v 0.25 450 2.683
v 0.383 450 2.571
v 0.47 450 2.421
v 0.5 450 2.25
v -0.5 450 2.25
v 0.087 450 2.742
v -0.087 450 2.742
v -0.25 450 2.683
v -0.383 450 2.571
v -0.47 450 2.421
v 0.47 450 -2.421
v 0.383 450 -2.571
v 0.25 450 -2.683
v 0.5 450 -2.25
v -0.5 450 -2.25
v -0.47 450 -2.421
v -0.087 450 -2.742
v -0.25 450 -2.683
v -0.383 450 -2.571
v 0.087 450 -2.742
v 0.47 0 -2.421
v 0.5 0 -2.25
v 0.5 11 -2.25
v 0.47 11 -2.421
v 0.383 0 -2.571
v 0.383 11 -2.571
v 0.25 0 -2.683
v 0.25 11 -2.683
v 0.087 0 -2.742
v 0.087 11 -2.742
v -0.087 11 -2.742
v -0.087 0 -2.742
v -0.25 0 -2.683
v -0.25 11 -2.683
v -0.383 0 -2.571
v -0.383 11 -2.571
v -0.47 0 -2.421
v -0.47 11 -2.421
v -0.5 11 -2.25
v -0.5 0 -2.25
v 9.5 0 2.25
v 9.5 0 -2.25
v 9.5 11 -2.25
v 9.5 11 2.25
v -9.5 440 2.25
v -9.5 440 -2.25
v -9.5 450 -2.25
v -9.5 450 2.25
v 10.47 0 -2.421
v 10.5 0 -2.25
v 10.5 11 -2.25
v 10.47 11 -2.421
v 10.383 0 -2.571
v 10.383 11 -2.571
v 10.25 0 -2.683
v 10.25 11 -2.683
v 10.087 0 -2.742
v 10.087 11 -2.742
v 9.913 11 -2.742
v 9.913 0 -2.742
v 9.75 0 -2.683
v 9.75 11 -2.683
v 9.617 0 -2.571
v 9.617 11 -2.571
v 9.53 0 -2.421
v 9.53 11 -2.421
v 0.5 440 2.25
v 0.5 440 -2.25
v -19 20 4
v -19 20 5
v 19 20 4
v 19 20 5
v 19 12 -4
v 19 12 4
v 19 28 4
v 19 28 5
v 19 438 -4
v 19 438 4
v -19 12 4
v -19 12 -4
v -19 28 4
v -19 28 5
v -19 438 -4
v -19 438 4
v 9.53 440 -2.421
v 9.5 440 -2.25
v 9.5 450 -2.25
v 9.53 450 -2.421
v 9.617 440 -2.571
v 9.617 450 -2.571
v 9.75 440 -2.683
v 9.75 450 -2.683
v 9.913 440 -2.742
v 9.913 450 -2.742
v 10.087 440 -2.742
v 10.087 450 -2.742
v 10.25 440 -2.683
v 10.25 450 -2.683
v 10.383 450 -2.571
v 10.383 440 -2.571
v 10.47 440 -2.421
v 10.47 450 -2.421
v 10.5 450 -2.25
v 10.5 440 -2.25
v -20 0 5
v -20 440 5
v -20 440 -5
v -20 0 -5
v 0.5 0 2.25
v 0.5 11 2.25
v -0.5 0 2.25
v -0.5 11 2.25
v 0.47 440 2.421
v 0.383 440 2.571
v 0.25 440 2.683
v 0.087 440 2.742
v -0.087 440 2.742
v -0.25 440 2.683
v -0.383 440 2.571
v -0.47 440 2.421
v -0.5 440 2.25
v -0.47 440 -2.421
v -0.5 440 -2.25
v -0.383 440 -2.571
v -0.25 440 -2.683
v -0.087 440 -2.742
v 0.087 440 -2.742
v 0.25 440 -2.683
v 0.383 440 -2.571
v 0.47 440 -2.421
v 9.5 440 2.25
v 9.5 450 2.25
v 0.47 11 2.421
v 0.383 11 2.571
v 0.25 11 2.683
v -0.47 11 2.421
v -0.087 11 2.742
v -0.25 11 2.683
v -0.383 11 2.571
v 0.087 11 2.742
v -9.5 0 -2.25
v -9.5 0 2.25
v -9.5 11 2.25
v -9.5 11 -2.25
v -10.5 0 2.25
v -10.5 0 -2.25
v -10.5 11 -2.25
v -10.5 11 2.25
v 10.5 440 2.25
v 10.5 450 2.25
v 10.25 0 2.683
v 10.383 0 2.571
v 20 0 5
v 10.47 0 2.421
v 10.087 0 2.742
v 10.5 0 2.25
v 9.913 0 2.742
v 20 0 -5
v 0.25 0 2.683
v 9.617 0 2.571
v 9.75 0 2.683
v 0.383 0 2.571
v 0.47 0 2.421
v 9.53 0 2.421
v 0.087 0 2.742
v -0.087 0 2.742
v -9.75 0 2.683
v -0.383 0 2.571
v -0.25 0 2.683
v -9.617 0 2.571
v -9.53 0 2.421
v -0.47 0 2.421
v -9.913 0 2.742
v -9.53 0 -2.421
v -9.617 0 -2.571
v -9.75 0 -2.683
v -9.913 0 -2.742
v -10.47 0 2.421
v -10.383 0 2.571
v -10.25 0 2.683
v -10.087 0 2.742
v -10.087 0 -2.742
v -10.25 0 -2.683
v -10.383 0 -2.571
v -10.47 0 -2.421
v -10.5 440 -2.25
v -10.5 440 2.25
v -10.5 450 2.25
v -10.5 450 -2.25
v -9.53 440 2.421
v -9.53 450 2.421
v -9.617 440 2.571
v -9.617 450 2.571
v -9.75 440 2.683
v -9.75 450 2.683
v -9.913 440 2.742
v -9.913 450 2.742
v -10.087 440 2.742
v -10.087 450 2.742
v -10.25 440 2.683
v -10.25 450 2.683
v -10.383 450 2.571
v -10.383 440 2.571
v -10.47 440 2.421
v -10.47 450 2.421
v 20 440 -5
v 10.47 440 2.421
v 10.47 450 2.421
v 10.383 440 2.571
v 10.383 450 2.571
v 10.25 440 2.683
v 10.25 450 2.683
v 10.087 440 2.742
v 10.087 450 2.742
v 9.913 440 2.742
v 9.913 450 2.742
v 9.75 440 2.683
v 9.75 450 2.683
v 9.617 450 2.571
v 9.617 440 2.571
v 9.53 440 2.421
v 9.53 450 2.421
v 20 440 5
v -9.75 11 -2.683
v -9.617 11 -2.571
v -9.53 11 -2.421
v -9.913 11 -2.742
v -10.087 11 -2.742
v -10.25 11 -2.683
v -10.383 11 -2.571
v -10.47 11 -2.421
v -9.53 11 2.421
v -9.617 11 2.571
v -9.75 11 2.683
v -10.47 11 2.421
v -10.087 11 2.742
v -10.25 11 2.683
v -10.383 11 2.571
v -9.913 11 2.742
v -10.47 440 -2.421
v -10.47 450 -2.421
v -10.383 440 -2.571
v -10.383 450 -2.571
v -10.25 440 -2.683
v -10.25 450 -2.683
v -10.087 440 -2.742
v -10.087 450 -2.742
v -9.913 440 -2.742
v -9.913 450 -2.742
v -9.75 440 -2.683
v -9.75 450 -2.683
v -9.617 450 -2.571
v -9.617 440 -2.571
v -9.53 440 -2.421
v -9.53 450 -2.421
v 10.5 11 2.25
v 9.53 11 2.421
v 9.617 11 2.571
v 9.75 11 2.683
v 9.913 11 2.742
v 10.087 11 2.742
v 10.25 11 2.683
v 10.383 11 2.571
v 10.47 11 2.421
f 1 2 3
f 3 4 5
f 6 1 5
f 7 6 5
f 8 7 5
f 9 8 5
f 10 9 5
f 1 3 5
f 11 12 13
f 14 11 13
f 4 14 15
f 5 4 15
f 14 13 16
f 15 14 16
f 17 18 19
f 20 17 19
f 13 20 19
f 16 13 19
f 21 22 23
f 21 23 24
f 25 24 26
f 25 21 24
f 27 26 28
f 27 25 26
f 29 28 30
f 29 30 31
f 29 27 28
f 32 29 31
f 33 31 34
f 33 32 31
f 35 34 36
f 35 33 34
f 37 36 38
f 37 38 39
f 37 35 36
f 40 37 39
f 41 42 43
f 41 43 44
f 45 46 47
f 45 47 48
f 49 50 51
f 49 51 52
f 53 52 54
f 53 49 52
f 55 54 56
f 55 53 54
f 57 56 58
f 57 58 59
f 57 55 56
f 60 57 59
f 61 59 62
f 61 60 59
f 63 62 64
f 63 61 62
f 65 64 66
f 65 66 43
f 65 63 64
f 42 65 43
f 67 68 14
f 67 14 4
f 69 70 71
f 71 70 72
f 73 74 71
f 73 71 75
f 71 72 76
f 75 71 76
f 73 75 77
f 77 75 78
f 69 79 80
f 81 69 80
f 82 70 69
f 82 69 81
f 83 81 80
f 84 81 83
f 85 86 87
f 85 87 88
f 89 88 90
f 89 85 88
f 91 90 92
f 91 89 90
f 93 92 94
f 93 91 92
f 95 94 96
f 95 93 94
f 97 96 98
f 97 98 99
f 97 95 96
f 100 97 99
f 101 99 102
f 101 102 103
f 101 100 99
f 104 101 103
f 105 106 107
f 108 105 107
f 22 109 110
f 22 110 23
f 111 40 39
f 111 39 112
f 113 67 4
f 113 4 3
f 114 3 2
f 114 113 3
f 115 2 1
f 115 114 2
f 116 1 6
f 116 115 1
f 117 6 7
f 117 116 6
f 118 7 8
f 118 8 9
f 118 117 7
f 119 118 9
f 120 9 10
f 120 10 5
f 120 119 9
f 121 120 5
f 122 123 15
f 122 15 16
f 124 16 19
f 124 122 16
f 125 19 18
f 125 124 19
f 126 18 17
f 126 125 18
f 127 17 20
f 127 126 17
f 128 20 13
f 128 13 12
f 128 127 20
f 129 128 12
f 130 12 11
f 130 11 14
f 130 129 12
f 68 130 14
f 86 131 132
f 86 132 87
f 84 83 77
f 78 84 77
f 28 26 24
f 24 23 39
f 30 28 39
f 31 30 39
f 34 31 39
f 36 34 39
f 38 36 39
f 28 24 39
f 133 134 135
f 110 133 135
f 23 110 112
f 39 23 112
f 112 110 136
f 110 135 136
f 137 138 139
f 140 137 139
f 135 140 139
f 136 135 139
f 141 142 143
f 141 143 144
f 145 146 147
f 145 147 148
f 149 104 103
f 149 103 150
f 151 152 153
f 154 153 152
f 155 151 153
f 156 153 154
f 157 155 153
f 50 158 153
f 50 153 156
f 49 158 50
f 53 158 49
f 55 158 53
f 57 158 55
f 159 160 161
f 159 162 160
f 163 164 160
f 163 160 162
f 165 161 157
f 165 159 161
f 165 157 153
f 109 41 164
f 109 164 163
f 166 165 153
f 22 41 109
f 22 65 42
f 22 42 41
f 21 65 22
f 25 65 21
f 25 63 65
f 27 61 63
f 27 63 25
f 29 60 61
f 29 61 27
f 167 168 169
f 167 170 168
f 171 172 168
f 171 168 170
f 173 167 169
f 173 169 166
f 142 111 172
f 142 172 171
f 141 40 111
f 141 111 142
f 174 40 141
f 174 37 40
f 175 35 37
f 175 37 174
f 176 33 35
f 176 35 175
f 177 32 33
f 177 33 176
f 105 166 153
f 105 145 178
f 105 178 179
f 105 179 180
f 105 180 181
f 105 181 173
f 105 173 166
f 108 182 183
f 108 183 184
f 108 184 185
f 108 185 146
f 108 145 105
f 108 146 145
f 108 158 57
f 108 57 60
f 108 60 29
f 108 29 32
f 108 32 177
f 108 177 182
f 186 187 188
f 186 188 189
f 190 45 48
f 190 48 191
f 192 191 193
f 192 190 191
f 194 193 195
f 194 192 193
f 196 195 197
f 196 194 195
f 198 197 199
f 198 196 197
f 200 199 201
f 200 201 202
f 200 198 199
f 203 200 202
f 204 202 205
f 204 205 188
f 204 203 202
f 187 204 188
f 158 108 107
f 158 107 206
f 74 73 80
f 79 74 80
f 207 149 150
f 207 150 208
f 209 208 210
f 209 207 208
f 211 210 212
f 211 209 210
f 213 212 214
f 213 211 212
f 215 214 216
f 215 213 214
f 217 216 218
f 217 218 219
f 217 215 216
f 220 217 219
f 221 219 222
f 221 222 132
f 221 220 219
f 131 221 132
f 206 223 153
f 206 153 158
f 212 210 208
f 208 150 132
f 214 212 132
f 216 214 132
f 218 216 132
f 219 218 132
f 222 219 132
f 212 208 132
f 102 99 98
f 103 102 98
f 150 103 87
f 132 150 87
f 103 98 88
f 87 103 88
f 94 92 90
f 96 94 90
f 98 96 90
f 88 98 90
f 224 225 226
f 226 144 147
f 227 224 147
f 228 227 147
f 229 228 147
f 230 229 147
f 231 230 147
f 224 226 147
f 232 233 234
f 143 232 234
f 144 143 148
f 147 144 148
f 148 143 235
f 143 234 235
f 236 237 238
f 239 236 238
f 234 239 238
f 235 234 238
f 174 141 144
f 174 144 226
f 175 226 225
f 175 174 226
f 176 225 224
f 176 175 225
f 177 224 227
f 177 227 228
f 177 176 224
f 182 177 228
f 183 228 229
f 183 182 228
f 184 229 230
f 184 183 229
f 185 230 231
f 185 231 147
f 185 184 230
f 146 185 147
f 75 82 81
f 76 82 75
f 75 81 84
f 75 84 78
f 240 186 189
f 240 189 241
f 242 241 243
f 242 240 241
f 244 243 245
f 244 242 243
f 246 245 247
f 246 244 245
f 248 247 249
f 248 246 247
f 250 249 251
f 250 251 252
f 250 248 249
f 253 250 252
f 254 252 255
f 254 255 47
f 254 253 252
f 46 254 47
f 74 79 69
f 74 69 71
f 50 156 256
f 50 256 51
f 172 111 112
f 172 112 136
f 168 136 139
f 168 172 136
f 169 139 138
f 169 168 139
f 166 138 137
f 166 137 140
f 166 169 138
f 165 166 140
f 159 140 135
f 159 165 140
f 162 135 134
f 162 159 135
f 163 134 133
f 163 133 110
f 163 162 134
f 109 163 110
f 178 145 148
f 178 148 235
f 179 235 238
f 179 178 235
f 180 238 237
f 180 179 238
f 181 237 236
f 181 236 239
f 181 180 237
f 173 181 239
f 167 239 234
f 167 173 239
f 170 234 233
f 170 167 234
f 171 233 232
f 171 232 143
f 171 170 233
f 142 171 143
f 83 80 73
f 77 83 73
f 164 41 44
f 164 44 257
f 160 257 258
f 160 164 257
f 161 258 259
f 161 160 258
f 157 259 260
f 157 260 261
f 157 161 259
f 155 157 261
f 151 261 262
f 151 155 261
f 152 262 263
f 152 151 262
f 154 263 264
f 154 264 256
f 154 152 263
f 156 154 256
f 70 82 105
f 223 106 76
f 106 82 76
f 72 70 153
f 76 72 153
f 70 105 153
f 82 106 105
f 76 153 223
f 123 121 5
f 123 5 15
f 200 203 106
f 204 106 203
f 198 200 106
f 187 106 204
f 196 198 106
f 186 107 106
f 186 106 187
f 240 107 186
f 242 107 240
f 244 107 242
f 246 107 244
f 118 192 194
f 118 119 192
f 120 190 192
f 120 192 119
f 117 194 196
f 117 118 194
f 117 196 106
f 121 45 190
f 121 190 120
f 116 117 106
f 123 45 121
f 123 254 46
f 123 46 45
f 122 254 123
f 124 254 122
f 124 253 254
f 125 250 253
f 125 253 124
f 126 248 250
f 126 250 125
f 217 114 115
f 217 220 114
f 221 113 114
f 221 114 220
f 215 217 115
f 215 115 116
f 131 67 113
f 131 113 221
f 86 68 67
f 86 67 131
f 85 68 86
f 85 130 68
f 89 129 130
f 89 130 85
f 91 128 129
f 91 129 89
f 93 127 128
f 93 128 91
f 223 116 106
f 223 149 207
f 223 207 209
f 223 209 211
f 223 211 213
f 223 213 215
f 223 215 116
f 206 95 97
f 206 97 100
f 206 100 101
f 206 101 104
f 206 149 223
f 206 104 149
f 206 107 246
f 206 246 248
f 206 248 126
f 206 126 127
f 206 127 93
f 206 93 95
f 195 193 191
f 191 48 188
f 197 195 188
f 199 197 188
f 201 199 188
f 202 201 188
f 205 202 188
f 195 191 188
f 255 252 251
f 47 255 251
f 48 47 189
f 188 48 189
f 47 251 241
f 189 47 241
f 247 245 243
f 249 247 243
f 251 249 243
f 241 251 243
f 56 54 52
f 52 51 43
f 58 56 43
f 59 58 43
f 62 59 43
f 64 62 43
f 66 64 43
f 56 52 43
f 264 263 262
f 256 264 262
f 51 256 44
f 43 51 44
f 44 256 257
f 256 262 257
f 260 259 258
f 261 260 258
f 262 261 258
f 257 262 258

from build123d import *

# Parameters (mm, degrees)
SKETCH2_W           = 40
SKETCH2_H           = 10
BOSS_EXTRUDE2_DEPTH = 440
SKETCH3_W           = 38
SKETCH3_H           = 8
CUT_EXTRUDE1_DEPTH  = 438
BOSS_EXTRUDE4_DEPTH = 10
LPATTERN2_COUNT     = 3
LPATTERN2_PITCH     = 10
SKETCH5_W           = 38
SKETCH5_H           = 8
BOSS_EXTRUDE5_DEPTH = 12
CUT_EXTRUDE2_DEPTH  = 11
LPATTERN3_COUNT     = 3
LPATTERN3_PITCH     = 10
SKETCH7_W           = 38
SKETCH7_H           = 8
CUT_EXTRUDE3_DEPTH  = 5


with BuildPart() as part:
    # Sketch2 → Boss-Extrude2 (new body)
    with BuildSketch(Plane(origin=(0, 0, 0), x_dir=(1, 0, 0), z_dir=(0, 1, 0))):
        Rectangle(SKETCH2_W, SKETCH2_H)
    extrude(amount=BOSS_EXTRUDE2_DEPTH)

    # Sketch3 → Cut-Extrude1 (cut)
    with BuildSketch(Plane(origin=(0, 0, 0), x_dir=(1, 0, 0), z_dir=(0, 1, 0))):
        Rectangle(SKETCH3_W, SKETCH3_H)
    extrude(amount=CUT_EXTRUDE1_DEPTH, mode=Mode.SUBTRACT)

    # Sketch4 → Boss-Extrude4 (add)
    with BuildSketch(Plane(origin=(0, 440, 0), x_dir=(1, 0, 0), z_dir=(0, 1, 0))):
        with BuildLine():
            Line((-10.5, -2.25), (-10.5, 2.25))
            ThreePointArc((-10.5, 2.25), (-10, 2.75), (-9.5, 2.25))
            Line((-9.5, 2.25), (-9.5, -2.25))
            ThreePointArc((-9.5, -2.25), (-10, -2.75), (-10.5, -2.25))
        make_face()
    boss_extrude4 = extrude(amount=BOSS_EXTRUDE4_DEPTH)

    # LPattern2: Boss-Extrude4 ×3
    with Locations(*[(i * LPATTERN2_PITCH, 0, 0) for i in range(1, LPATTERN2_COUNT)]):
        add(boss_extrude4)

    # Sketch5 → Boss-Extrude5 (add)
    with BuildSketch(Plane(origin=(0, 0, 0), x_dir=(-1, 0, 0), z_dir=(0, -1, 0))):
        Rectangle(SKETCH5_W, SKETCH5_H)
    extrude(amount=-BOSS_EXTRUDE5_DEPTH)

    # Sketch6 → Cut-Extrude2 (cut)
    with BuildSketch(Plane.XZ):
        with BuildLine():
            Line((10.5, 2.25), (10.5, -2.25))
            ThreePointArc((10.5, -2.25), (10, -2.75), (9.5, -2.25))
            Line((9.5, -2.25), (9.5, 2.25))
            ThreePointArc((9.5, 2.25), (10, 2.75), (10.5, 2.25))
        make_face()
    cut_extrude2 = extrude(amount=-CUT_EXTRUDE2_DEPTH, mode=Mode.SUBTRACT)

    # LPattern3: Cut-Extrude2 ×3
    with Locations(*[(-i * LPATTERN3_PITCH, 0, 0) for i in range(1, LPATTERN3_COUNT)]):
        add(cut_extrude2, mode=Mode.SUBTRACT)

    # Sketch7 → Cut-Extrude3 (cut)
    with BuildSketch(Plane.XY.offset(5)):
        with Locations((0, 24)):
            Rectangle(SKETCH7_W, SKETCH7_H)
    extrude(amount=-CUT_EXTRUDE3_DEPTH, mode=Mode.SUBTRACT)


solid = part.part
